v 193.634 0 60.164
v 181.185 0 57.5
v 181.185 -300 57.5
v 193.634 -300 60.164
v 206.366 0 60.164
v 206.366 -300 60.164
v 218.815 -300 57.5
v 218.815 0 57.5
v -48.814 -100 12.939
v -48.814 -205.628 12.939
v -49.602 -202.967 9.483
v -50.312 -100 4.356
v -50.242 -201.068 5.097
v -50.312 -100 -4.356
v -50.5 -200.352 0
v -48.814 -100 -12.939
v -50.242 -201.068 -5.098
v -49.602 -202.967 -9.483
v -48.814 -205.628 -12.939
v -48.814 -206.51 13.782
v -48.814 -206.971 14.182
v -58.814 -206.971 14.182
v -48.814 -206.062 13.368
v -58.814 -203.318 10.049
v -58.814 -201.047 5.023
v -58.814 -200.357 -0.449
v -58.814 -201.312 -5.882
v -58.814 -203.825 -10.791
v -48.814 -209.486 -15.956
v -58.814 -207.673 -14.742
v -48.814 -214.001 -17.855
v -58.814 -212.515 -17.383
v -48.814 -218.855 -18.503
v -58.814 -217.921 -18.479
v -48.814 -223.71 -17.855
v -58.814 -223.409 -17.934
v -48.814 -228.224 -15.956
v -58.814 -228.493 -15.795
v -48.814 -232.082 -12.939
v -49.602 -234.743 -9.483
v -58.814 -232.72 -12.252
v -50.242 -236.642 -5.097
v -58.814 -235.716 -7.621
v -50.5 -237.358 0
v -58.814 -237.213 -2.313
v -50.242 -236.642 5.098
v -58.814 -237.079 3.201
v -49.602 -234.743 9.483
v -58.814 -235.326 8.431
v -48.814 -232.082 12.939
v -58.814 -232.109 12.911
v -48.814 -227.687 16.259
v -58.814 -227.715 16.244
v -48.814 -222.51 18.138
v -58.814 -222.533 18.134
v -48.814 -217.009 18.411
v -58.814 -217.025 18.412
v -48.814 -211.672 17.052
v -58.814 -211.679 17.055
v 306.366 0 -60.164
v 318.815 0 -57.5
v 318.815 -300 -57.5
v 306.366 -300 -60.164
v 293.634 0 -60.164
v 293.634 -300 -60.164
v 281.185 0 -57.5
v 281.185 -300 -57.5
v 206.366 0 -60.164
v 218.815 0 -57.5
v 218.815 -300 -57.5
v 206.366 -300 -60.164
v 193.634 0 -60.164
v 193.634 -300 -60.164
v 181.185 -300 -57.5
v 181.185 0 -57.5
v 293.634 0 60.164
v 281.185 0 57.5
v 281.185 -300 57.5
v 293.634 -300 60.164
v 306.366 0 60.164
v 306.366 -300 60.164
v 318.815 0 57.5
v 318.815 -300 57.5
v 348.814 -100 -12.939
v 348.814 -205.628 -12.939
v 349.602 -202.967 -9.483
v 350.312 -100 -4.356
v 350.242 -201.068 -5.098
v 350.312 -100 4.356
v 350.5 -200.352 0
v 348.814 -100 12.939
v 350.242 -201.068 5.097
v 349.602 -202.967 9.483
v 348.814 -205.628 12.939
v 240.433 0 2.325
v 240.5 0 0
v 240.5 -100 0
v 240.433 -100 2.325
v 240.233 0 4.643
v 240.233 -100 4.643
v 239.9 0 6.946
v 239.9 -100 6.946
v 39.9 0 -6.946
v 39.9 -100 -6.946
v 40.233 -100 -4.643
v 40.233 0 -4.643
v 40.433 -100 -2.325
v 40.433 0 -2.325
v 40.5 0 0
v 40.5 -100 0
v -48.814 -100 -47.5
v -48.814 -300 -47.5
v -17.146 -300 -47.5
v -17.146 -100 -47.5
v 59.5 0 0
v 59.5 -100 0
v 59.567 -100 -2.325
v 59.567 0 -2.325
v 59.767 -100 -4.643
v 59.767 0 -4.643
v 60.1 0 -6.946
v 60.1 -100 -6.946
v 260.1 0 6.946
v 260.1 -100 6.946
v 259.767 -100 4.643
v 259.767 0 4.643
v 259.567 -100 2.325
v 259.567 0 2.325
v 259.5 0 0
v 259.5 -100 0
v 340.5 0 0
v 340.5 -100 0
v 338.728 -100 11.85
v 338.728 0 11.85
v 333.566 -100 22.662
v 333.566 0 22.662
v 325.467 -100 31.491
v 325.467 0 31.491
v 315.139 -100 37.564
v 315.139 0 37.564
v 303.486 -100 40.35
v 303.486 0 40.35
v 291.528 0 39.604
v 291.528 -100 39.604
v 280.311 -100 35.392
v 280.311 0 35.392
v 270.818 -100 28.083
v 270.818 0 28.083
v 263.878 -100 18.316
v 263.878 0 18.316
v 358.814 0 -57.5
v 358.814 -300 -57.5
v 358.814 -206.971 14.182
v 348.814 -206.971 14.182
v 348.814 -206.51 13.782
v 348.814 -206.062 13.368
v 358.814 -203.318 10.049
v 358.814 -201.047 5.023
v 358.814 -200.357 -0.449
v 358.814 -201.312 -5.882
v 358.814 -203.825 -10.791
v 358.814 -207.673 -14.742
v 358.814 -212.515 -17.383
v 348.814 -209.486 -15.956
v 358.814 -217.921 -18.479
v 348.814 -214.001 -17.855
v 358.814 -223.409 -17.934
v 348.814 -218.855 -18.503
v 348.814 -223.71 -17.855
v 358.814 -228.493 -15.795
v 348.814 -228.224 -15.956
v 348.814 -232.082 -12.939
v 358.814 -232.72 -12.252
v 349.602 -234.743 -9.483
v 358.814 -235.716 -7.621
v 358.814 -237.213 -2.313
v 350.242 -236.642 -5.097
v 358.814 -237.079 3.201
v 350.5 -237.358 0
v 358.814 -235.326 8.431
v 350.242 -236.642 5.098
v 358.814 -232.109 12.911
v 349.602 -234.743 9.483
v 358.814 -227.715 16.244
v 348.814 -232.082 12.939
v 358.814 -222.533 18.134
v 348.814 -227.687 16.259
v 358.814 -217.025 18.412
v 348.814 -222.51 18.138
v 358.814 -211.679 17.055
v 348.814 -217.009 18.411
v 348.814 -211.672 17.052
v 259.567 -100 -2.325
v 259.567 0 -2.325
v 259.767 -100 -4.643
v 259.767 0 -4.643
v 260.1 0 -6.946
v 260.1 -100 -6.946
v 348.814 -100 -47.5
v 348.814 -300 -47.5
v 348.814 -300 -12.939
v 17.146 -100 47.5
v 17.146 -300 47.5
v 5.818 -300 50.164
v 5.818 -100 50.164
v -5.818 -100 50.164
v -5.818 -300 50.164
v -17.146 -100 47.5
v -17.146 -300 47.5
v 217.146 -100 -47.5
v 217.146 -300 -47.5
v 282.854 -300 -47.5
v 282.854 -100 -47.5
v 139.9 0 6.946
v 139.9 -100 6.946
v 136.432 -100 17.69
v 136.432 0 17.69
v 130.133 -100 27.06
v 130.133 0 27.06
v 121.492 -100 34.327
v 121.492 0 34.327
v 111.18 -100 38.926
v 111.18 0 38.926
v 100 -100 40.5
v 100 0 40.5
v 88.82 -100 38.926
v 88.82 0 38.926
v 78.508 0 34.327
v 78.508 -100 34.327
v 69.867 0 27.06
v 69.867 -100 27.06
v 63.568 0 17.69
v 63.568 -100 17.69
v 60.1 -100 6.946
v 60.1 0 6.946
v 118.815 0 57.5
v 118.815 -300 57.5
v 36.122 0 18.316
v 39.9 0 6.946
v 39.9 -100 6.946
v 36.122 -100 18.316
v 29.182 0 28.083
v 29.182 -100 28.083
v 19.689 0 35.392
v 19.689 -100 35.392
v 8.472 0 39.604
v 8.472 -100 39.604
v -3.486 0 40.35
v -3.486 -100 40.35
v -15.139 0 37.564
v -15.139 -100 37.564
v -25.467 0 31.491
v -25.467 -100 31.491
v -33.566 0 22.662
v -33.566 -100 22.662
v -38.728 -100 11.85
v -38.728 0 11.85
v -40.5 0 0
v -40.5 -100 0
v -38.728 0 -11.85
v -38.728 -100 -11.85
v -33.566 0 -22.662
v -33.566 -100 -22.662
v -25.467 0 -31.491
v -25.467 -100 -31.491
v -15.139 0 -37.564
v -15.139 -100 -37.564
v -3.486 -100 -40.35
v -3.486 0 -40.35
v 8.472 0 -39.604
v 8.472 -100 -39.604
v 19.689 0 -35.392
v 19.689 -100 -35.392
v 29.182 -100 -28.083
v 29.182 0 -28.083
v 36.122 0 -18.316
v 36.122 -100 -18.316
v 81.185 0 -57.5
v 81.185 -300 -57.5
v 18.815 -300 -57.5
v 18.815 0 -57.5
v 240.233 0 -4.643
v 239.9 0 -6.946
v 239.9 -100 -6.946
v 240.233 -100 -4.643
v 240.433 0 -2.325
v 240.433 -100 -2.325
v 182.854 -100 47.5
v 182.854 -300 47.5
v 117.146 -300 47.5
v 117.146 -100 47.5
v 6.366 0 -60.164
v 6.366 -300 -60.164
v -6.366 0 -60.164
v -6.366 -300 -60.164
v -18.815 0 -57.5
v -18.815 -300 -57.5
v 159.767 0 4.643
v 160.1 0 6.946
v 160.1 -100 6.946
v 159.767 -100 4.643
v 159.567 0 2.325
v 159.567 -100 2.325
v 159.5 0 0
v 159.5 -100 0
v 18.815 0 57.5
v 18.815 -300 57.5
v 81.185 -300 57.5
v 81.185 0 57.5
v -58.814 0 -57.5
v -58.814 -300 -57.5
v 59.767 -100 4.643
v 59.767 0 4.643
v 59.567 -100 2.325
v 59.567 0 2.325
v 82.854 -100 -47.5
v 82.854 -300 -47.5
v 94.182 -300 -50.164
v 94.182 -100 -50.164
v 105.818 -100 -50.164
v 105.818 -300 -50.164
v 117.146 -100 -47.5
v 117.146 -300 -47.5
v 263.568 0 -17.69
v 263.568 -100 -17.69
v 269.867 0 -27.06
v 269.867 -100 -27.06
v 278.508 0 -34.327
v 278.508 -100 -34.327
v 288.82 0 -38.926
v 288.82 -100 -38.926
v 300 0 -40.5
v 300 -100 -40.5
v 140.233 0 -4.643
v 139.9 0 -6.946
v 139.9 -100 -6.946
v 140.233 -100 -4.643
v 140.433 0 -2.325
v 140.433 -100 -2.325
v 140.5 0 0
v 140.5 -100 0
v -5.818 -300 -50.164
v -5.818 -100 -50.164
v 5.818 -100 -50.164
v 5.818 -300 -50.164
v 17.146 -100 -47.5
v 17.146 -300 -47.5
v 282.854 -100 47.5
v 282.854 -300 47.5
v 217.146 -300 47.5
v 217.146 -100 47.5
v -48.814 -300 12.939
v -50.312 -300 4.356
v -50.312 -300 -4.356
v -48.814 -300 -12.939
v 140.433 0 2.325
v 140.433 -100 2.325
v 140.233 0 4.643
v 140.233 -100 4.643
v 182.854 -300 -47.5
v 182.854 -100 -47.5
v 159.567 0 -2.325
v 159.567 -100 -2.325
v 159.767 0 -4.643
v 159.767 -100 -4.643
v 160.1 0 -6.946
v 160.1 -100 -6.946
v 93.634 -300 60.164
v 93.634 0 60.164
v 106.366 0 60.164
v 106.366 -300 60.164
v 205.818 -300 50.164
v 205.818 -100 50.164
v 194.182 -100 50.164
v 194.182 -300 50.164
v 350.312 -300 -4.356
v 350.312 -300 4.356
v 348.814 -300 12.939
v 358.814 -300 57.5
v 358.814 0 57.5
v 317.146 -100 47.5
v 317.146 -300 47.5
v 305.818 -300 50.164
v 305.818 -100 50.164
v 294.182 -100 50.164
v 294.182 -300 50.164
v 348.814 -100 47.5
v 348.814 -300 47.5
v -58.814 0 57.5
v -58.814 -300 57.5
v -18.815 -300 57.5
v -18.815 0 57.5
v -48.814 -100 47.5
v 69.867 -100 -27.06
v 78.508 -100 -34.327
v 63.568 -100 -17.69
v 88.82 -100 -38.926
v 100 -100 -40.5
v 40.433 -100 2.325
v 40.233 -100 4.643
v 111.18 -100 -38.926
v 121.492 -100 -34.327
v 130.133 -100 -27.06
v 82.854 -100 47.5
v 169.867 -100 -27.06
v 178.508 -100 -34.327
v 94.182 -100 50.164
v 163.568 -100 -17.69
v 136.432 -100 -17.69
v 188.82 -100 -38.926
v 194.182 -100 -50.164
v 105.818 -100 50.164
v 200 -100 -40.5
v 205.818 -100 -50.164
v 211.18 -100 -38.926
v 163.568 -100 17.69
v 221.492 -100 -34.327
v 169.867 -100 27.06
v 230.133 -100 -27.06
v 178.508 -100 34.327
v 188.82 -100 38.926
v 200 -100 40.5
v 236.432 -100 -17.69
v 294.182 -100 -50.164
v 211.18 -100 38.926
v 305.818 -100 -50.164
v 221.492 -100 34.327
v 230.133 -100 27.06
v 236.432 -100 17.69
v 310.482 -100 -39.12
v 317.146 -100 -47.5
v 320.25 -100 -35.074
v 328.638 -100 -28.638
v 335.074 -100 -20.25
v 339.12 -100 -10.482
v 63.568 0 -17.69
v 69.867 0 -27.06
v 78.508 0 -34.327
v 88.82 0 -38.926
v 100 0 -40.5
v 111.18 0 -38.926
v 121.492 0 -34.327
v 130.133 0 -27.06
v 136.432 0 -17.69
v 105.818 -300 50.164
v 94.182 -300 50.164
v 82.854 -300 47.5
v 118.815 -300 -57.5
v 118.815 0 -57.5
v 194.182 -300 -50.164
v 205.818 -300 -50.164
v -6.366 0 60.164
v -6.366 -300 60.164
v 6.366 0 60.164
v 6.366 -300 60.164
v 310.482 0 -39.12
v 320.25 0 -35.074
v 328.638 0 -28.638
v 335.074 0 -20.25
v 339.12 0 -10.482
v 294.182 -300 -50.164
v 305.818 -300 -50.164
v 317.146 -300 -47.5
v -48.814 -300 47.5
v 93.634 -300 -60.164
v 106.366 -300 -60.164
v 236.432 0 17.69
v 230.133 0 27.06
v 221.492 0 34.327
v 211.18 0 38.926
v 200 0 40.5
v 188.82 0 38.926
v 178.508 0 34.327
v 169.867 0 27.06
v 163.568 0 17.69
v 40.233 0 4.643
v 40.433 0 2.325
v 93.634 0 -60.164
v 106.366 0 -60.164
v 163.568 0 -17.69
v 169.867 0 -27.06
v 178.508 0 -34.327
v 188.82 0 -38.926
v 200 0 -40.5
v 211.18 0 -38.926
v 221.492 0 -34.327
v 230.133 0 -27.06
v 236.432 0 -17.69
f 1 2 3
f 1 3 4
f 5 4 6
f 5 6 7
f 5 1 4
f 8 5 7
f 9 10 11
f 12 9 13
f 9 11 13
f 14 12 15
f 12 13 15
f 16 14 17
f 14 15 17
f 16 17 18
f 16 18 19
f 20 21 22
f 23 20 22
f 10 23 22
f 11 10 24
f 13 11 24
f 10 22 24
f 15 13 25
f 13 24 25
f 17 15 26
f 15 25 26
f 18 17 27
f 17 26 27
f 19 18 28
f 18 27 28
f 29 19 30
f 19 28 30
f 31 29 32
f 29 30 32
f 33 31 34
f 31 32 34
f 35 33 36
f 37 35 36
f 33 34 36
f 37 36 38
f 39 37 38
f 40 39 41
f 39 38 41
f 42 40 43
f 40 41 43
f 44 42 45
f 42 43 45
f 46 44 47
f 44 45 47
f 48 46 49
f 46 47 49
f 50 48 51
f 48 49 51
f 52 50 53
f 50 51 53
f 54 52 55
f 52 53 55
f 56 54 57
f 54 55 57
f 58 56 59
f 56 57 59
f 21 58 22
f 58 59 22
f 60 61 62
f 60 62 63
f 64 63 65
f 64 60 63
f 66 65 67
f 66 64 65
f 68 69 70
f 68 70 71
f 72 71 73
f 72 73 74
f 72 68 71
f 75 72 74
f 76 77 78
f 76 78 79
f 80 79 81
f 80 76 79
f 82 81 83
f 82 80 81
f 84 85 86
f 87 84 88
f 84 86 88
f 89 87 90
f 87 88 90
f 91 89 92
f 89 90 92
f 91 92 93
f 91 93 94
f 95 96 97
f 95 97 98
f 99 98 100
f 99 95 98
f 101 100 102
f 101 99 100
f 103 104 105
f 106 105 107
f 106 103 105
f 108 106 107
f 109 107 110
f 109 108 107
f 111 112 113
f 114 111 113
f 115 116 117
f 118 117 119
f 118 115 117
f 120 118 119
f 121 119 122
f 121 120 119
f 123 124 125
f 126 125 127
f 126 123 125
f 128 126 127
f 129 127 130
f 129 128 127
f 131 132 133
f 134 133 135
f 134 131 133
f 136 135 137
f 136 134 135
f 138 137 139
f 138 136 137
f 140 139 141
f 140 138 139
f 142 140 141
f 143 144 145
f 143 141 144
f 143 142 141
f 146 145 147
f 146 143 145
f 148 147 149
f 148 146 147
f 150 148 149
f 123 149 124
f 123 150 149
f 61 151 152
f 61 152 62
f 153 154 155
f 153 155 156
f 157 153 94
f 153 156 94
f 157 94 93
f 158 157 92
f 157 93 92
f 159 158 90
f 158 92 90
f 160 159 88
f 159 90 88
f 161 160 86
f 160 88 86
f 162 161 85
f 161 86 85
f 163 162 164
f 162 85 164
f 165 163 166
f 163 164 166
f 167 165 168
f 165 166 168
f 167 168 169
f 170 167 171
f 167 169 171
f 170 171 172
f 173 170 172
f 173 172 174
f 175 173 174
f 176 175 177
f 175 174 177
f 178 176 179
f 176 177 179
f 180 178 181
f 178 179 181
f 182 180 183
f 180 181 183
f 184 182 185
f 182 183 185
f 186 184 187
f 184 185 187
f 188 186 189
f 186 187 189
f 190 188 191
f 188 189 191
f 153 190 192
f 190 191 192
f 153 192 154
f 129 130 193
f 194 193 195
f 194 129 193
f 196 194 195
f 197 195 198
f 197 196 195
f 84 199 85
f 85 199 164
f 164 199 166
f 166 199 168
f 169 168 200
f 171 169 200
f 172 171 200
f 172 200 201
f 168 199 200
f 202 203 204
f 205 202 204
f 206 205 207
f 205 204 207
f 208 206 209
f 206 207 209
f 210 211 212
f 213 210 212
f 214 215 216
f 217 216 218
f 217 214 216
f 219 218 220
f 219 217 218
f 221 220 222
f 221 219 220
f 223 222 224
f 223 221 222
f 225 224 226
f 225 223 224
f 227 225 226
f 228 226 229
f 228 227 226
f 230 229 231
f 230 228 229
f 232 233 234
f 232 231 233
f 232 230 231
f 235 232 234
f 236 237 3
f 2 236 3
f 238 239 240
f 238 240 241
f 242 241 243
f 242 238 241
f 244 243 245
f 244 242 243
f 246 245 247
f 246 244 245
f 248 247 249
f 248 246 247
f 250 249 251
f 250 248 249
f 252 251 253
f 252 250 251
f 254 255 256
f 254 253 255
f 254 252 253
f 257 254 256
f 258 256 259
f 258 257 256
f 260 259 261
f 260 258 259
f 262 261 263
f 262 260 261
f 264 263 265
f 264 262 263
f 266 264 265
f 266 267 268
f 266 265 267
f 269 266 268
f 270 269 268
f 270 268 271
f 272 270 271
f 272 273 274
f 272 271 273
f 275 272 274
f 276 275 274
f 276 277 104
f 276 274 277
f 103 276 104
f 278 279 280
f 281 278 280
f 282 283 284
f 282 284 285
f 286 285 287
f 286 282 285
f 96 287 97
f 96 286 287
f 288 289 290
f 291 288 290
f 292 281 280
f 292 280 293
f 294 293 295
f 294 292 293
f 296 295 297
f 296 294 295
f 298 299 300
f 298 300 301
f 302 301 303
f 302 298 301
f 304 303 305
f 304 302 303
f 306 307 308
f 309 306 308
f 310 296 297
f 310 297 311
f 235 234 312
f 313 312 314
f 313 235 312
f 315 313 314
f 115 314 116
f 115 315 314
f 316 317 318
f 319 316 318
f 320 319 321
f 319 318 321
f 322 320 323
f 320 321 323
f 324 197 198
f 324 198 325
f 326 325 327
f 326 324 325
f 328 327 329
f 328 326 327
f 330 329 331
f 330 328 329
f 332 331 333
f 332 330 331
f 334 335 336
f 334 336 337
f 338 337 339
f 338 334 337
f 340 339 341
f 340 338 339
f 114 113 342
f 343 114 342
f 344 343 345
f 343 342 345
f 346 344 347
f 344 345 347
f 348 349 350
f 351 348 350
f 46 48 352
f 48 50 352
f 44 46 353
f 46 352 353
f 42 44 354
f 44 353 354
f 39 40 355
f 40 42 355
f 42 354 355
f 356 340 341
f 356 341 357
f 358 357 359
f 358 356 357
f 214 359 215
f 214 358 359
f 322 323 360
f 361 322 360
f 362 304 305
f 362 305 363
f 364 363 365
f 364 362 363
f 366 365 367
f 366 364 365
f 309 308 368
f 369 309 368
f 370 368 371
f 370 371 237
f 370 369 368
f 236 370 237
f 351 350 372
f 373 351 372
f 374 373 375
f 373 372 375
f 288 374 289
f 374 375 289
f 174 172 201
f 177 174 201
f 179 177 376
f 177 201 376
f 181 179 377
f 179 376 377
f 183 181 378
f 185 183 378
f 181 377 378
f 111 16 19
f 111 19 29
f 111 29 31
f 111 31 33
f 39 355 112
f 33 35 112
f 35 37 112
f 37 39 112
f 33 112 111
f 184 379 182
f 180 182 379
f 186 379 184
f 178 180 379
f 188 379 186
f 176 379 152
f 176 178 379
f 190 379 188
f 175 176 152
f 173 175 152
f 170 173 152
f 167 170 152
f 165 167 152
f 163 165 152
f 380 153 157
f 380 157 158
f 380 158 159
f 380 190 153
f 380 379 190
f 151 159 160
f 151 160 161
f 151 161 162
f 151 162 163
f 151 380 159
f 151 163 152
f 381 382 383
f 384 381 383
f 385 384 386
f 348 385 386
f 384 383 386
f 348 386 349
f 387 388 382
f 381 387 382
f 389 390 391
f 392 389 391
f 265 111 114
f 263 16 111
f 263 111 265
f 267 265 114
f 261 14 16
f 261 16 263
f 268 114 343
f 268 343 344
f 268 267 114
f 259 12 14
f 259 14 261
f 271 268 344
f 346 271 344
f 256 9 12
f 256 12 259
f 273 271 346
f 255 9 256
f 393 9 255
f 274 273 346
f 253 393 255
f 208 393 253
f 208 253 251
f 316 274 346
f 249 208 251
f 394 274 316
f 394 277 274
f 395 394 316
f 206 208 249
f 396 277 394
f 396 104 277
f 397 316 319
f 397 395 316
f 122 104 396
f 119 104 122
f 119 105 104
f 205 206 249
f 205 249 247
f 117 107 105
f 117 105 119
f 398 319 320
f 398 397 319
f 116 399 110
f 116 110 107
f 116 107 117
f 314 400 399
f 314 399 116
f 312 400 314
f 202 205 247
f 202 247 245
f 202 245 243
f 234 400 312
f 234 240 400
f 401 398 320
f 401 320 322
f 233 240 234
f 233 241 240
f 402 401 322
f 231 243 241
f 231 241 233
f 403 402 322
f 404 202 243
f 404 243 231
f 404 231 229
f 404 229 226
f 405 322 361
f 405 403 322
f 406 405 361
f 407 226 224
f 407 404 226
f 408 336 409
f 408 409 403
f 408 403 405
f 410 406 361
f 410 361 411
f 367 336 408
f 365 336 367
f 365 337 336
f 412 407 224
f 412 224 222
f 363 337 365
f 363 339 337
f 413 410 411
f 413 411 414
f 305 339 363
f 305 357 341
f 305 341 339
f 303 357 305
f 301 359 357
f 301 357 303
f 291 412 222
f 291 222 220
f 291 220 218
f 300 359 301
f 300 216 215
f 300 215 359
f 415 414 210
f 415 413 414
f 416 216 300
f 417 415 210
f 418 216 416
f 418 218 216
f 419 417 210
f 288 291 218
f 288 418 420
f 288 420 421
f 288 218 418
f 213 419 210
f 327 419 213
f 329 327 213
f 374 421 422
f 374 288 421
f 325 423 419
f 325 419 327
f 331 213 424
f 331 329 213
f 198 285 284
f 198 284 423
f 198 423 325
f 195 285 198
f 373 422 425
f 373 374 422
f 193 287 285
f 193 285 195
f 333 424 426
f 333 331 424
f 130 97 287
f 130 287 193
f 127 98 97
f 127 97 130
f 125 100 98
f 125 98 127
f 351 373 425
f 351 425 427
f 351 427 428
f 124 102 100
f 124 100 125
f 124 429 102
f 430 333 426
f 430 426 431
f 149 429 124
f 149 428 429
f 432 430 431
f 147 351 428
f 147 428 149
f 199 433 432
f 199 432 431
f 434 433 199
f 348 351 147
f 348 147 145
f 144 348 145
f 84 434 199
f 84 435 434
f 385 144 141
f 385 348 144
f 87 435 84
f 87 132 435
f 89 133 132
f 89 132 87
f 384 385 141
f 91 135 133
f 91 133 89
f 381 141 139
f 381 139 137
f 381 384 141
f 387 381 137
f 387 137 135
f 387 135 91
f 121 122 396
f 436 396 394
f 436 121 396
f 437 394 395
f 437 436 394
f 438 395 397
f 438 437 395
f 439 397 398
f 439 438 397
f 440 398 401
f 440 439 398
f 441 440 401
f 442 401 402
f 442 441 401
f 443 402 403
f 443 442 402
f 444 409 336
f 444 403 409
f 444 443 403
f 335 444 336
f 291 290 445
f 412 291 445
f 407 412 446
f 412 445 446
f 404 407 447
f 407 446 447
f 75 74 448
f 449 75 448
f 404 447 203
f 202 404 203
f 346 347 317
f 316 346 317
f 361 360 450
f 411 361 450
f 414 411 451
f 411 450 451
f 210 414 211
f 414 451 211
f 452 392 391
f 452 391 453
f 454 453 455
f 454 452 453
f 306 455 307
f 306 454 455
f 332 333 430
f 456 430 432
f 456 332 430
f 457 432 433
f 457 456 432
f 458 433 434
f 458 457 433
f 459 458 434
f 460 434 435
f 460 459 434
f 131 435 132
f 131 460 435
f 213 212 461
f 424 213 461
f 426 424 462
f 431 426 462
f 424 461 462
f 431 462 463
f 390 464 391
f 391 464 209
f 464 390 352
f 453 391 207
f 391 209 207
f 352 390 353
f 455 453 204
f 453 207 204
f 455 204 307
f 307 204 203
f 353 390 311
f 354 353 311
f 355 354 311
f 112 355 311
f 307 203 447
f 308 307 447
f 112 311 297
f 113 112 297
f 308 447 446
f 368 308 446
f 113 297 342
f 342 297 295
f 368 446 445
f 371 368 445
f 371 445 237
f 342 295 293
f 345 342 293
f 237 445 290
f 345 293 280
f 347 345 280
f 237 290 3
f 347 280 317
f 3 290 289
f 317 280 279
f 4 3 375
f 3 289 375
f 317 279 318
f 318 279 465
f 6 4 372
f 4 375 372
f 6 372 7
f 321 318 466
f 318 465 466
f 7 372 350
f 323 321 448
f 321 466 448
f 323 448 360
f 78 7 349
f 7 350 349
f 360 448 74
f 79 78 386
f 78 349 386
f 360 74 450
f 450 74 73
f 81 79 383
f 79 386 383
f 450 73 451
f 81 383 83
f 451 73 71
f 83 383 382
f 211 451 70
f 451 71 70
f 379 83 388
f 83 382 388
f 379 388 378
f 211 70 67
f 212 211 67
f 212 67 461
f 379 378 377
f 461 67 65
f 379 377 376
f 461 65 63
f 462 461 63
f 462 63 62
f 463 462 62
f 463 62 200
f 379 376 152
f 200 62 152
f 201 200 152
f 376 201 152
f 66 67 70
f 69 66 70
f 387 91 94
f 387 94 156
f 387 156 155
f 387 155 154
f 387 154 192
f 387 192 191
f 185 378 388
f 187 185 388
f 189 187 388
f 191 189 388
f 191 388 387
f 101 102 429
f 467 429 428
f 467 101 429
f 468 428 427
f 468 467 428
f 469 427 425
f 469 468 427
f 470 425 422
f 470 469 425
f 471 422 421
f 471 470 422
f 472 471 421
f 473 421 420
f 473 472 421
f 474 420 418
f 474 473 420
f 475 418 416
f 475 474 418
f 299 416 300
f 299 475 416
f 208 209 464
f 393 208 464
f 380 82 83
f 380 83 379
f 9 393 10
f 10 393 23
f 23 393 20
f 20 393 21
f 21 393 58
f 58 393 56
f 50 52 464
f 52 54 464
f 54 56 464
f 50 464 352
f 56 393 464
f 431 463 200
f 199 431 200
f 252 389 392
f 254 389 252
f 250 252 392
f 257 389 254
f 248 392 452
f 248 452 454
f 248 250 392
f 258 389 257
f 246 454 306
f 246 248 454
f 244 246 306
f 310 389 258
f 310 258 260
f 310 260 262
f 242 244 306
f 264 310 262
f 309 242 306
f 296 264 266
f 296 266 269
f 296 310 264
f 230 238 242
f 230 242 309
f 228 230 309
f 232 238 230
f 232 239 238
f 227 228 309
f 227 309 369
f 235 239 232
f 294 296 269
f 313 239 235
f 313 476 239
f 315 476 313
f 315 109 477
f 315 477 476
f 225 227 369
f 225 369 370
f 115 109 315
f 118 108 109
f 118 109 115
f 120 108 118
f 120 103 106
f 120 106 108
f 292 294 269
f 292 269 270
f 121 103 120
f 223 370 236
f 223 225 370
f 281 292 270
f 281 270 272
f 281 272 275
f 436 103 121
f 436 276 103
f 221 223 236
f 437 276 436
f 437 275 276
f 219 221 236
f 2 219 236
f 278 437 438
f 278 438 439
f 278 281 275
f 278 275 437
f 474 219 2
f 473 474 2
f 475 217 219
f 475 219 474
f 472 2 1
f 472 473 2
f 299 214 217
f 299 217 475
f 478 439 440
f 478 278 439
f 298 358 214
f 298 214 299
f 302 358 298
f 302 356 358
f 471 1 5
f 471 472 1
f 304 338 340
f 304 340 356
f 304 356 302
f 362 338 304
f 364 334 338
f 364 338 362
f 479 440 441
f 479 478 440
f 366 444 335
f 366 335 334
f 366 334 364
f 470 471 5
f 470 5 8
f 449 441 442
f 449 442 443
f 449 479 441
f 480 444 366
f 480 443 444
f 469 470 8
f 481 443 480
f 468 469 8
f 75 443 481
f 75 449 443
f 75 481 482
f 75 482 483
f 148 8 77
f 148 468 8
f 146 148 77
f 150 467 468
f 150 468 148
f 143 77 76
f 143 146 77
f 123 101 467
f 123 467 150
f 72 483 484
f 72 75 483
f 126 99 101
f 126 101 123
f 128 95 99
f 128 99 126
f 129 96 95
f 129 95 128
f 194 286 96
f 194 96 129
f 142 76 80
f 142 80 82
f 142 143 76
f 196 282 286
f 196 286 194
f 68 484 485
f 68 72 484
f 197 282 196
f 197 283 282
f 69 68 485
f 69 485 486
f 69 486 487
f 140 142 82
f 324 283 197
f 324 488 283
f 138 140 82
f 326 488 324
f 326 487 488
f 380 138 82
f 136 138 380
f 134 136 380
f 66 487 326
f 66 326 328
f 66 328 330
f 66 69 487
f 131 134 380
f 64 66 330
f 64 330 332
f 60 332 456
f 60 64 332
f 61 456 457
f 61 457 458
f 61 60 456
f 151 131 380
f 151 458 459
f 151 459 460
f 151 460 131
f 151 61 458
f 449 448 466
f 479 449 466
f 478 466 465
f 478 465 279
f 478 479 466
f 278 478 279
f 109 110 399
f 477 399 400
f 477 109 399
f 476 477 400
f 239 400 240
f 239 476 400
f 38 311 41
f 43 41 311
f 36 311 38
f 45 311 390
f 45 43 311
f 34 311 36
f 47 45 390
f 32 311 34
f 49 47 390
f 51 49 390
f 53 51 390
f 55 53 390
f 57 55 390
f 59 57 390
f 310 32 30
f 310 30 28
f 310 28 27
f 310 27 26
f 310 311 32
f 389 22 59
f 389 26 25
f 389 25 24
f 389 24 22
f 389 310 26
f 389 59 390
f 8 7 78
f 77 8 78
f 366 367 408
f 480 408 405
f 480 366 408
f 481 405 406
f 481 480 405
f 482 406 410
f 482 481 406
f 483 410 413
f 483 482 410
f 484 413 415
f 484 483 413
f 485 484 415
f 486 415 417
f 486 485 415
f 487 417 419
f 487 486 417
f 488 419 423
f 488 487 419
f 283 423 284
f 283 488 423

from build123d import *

# Parameters (mm, degrees)
BOSS_EXTRUDE2_DEPTH = 300
CUT_EXTRUDE1_DEPTH  = 200
SKETCH4_R           = 18.503
CUT_EXTRUDE2_DEPTH  = 500
CUT_EXTRUDE3_DEPTH  = 300


with BuildPart() as part:
    # Sketch1 → Boss-Extrude2 (new body)
    with BuildSketch(Plane(origin=(0, 0, 0), x_dir=(1, 0, 0), z_dir=(0, 1, 0))):
        with BuildLine():
            ThreePointArc((39.9, 6.945502142), (43.30489778, 21.11670865), (50, 34.062442661))
            ThreePointArc((50, 34.062442661), (36.348342006, 48.363705745), (18.814887722, 57.5))
            Line((18.814887722, 57.5), (0, 57.5))
            Line((0, 57.5), (0, 40.5))
            ThreePointArc((0, 40.5), (26.066809963, 30.99631298), (39.9, 6.945502142))
        make_face()
        with BuildLine():
            ThreePointArc((0, -40.5), (-40.5, 0), (0, 40.5))
            Line((0, 40.5), (0, 57.5))
            Line((0, 57.5), (-18.814887722, 57.5))
            ThreePointArc((-18.814887722, 57.5), (-44.4487457, 41.04337956), (-58.814340786, 14.181795299))
            Line((-58.814340786, 14.181795299), (-58.814340786, -14.181795299))
            ThreePointArc((-58.814340786, -14.181795299), (-44.4487457, -41.04337956), (-18.814887722, -57.5))
            Line((-18.814887722, -57.5), (0, -57.5))
            Line((0, -57.5), (0, -40.5))
        make_face()
        with BuildLine():
            ThreePointArc((18.814887722, -57.5), (36.348342006, -48.363705745), (50, -34.062442661))
            ThreePointArc((50, -34.062442661), (43.30489778, -21.11670865), (39.9, -6.945502142))
            ThreePointArc((39.9, -6.945502142), (26.066809963, -30.99631298), (0, -40.5))
            Line((0, -40.5), (0, -57.5))
            Line((0, -57.5), (18.814887722, -57.5))
        make_face()
        with BuildLine():
            ThreePointArc((60.1, -6.945502142), (59.650278811, -3.485685012), (59.5, 0))
            Line((59.5, 0), (40.5, 0))
            ThreePointArc((40.5, 0), (40.349721189, -3.485685012), (39.9, -6.945502142))
            ThreePointArc((39.9, -6.945502142), (43.30489778, -21.11670865), (50, -34.062442661))
            ThreePointArc((50, -34.062442661), (56.69510222, -21.11670865), (60.1, -6.945502142))
        make_face()
        with BuildLine():
            Line((40.5, 0), (59.5, 0))
            ThreePointArc((59.5, 0), (59.650278811, 3.485685012), (60.1, 6.945502142))
            ThreePointArc((60.1, 6.945502142), (56.69510222, 21.11670865), (50, 34.062442661))
            ThreePointArc((50, 34.062442661), (43.30489778, 21.11670865), (39.9, 6.945502142))
            ThreePointArc((39.9, 6.945502142), (40.349721189, 3.485685012), (40.5, 0))
        make_face()
        with BuildLine():
            ThreePointArc((139.9, -6.945502142), (100, -40.5), (60.1, -6.945502142))
            ThreePointArc((60.1, -6.945502142), (56.69510222, -21.11670865), (50, -34.062442661))
            ThreePointArc((50, -34.062442661), (63.651657994, -48.363705745), (81.185112278, -57.5))
            Line((81.185112278, -57.5), (118.814887722, -57.5))
            ThreePointArc((118.814887722, -57.5), (136.348342006, -48.363705745), (150, -34.062442661))
            ThreePointArc((150, -34.062442661), (143.30489778, -21.11670865), (139.9, -6.945502142))
        make_face()
        with BuildLine():
            ThreePointArc((50, 34.062442661), (56.69510222, 21.11670865), (60.1, 6.945502142))
            ThreePointArc((60.1, 6.945502142), (100, 40.5), (139.9, 6.945502142))
            ThreePointArc((139.9, 6.945502142), (143.30489778, 21.11670865), (150, 34.062442661))
            ThreePointArc((150, 34.062442661), (136.348342006, 48.363705745), (118.814887722, 57.5))
            Line((118.814887722, 57.5), (81.185112278, 57.5))
            ThreePointArc((81.185112278, 57.5), (63.651657994, 48.363705745), (50, 34.062442661))
        make_face()
        with BuildLine():
            ThreePointArc((150, 34.062442661), (143.30489778, 21.11670865), (139.9, 6.945502142))
            ThreePointArc((139.9, 6.945502142), (140.349721189, 3.485685012), (140.5, 0))
            Line((140.5, 0), (159.5, 0))
            ThreePointArc((159.5, 0), (159.650278811, 3.485685012), (160.1, 6.945502142))
            ThreePointArc((160.1, 6.945502142), (156.69510222, 21.11670865), (150, 34.062442661))
        make_face()
        with BuildLine():
            ThreePointArc((140.5, 0), (140.349721189, -3.485685012), (139.9, -6.945502142))
            ThreePointArc((139.9, -6.945502142), (143.30489778, -21.11670865), (150, -34.062442661))
            ThreePointArc((150, -34.062442661), (156.69510222, -21.11670865), (160.1, -6.945502142))
            ThreePointArc((160.1, -6.945502142), (159.650278811, -3.485685012), (159.5, 0))
            Line((159.5, 0), (140.5, 0))
        make_face()
        with BuildLine():
            ThreePointArc((181.185112278, 57.5), (163.651657994, 48.363705745), (150, 34.062442661))
            ThreePointArc((150, 34.062442661), (156.69510222, 21.11670865), (160.1, 6.945502142))
            ThreePointArc((160.1, 6.945502142), (200, 40.5), (239.9, 6.945502142))
            ThreePointArc((239.9, 6.945502142), (243.30489778, 21.11670865), (250, 34.062442661))
            ThreePointArc((250, 34.062442661), (236.348342006, 48.363705745), (218.814887722, 57.5))
            Line((218.814887722, 57.5), (181.185112278, 57.5))
        make_face()
        with BuildLine():
            ThreePointArc((160.1, -6.945502142), (156.69510222, -21.11670865), (150, -34.062442661))
            ThreePointArc((150, -34.062442661), (163.651657994, -48.363705745), (181.185112278, -57.5))
            Line((181.185112278, -57.5), (218.814887722, -57.5))
            ThreePointArc((218.814887722, -57.5), (236.348342006, -48.363705745), (250, -34.062442661))
            ThreePointArc((250, -34.062442661), (243.30489778, -21.11670865), (239.9, -6.945502142))
            ThreePointArc((239.9, -6.945502142), (200, -40.5), (160.1, -6.945502142))
        make_face()
        with BuildLine():
            ThreePointArc((250, 34.062442661), (243.30489778, 21.11670865), (239.9, 6.945502142))
            ThreePointArc((239.9, 6.945502142), (240.349721189, 3.485685012), (240.5, 0))
            Line((240.5, 0), (259.5, 0))
            ThreePointArc((259.5, 0), (259.650278811, 3.485685012), (260.1, 6.945502142))
            ThreePointArc((260.1, 6.945502142), (256.69510222, 21.11670865), (250, 34.062442661))
        make_face()
        with BuildLine():
            ThreePointArc((240.5, 0), (240.349721189, -3.485685012), (239.9, -6.945502142))
            ThreePointArc((239.9, -6.945502142), (243.30489778, -21.11670865), (250, -34.062442661))
            ThreePointArc((250, -34.062442661), (256.69510222, -21.11670865), (260.1, -6.945502142))
            ThreePointArc((260.1, -6.945502142), (259.650278811, -3.485685012), (259.5, 0))
            Line((259.5, 0), (240.5, 0))
        make_face()
        with BuildLine():
            ThreePointArc((281.185112278, 57.5), (263.651657994, 48.363705745), (250, 34.062442661))
            ThreePointArc((250, 34.062442661), (256.69510222, 21.11670865), (260.1, 6.945502142))
            ThreePointArc((260.1, 6.945502142), (273.933190037, 30.99631298), (300, 40.5))
            Line((300, 40.5), (300, 57.5))
            Line((300, 57.5), (281.185112278, 57.5))
        make_face()
        with BuildLine():
            ThreePointArc((260.1, -6.945502142), (256.69510222, -21.11670865), (250, -34.062442661))
            ThreePointArc((250, -34.062442661), (263.651657994, -48.363705745), (281.185112278, -57.5))
            Line((281.185112278, -57.5), (300, -57.5))
            Line((300, -57.5), (318.814887722, -57.5))
            ThreePointArc((318.814887722, -57.5), (344.4487457, -41.04337956), (358.814340786, -14.181795299))
            Line((358.814340786, -14.181795299), (358.814340786, 14.181795299))
            ThreePointArc((358.814340786, 14.181795299), (344.4487457, 41.04337956), (318.814887722, 57.5))
            Line((318.814887722, 57.5), (300, 57.5))
            Line((300, 57.5), (300, 40.5))
            ThreePointArc((300, 40.5), (328.637824638, 28.637824638), (340.5, 0))
            ThreePointArc((340.5, 0), (303.485685012, -40.349721189), (260.1, -6.945502142))
        make_face()
        with BuildLine():
            ThreePointArc((81.185112278, -57.5), (63.651657994, -48.363705745), (50, -34.062442661))
            ThreePointArc((50, -34.062442661), (36.348342006, -48.363705745), (18.814887722, -57.5))
            Line((18.814887722, -57.5), (81.185112278, -57.5))
        make_face()
        with BuildLine():
            ThreePointArc((181.185112278, -57.5), (163.651657994, -48.363705745), (150, -34.062442661))
            ThreePointArc((150, -34.062442661), (136.348342006, -48.363705745), (118.814887722, -57.5))
            Line((118.814887722, -57.5), (181.185112278, -57.5))
        make_face()
        with BuildLine():
            ThreePointArc((250, -34.062442661), (236.348342006, -48.363705745), (218.814887722, -57.5))
            Line((218.814887722, -57.5), (281.185112278, -57.5))
            ThreePointArc((281.185112278, -57.5), (263.651657994, -48.363705745), (250, -34.062442661))
        make_face()
        with BuildLine():
            ThreePointArc((18.814887722, 57.5), (36.348342006, 48.363705745), (50, 34.062442661))
            ThreePointArc((50, 34.062442661), (63.651657994, 48.363705745), (81.185112278, 57.5))
            Line((81.185112278, 57.5), (18.814887722, 57.5))
        make_face()
        with BuildLine():
            ThreePointArc((118.814887722, 57.5), (136.348342006, 48.363705745), (150, 34.062442661))
            ThreePointArc((150, 34.062442661), (163.651657994, 48.363705745), (181.185112278, 57.5))
            Line((181.185112278, 57.5), (118.814887722, 57.5))
        make_face()
        with BuildLine():
            Line((281.185112278, 57.5), (218.814887722, 57.5))
            ThreePointArc((218.814887722, 57.5), (236.348342006, 48.363705745), (250, 34.062442661))
            ThreePointArc((250, 34.062442661), (263.651657994, 48.363705745), (281.185112278, 57.5))
        make_face()
        with BuildLine():
            ThreePointArc((358.814340786, -14.181795299), (344.4487457, -41.04337956), (318.814887722, -57.5))
            Line((318.814887722, -57.5), (358.814340786, -57.5))
            Line((358.814340786, -57.5), (358.814340786, -14.181795299))
        make_face()
        with BuildLine():
            Line((358.814340786, 57.5), (318.814887722, 57.5))
            ThreePointArc((318.814887722, 57.5), (344.4487457, 41.04337956), (358.814340786, 14.181795299))
            Line((358.814340786, 14.181795299), (358.814340786, 57.5))
        make_face()
        with BuildLine():
            ThreePointArc((-58.814340786, 14.181795299), (-44.4487457, 41.04337956), (-18.814887722, 57.5))
            Line((-18.814887722, 57.5), (-58.814340786, 57.5))
            Line((-58.814340786, 57.5), (-58.814340786, 14.181795299))
        make_face()
        with BuildLine():
            Line((-58.814340786, -57.5), (-18.814887722, -57.5))
            ThreePointArc((-18.814887722, -57.5), (-44.4487457, -41.04337956), (-58.814340786, -14.181795299))
            Line((-58.814340786, -14.181795299), (-58.814340786, -57.5))
        make_face()
        with BuildLine():
            Line((0, 57.5), (18.814887722, 57.5))
            ThreePointArc((18.814887722, 57.5), (0, 60.5), (-18.814887722, 57.5))
            Line((-18.814887722, 57.5), (0, 57.5))
        make_face()
        with BuildLine():
            ThreePointArc((118.814887722, 57.5), (100, 60.5), (81.185112278, 57.5))
            Line((81.185112278, 57.5), (118.814887722, 57.5))
        make_face()
        with BuildLine():
            ThreePointArc((218.814887722, 57.5), (200, 60.5), (181.185112278, 57.5))
            Line((181.185112278, 57.5), (218.814887722, 57.5))
        make_face()
        with BuildLine():
            ThreePointArc((318.814887722, 57.5), (300, 60.5), (281.185112278, 57.5))
            Line((281.185112278, 57.5), (300, 57.5))
            Line((300, 57.5), (318.814887722, 57.5))
        make_face()
        with BuildLine():
            Line((300, -57.5), (281.185112278, -57.5))
            ThreePointArc((281.185112278, -57.5), (300, -60.5), (318.814887722, -57.5))
            Line((318.814887722, -57.5), (300, -57.5))
        make_face()
        with BuildLine():
            Line((218.814887722, -57.5), (181.185112278, -57.5))
            ThreePointArc((181.185112278, -57.5), (200, -60.5), (218.814887722, -57.5))
        make_face()
        with BuildLine():
            Line((118.814887722, -57.5), (81.185112278, -57.5))
            ThreePointArc((81.185112278, -57.5), (100, -60.5), (118.814887722, -57.5))
        make_face()
        with BuildLine():
            ThreePointArc((-18.814887722, -57.5), (0, -60.5), (18.814887722, -57.5))
            Line((18.814887722, -57.5), (0, -57.5))
            Line((0, -57.5), (-18.814887722, -57.5))
        make_face()
        with BuildLine():
            Line((-58.814340786, -14.181795299), (-58.814340786, 14.181795299))
            ThreePointArc((-58.814340786, 14.181795299), (-60.5, 0), (-58.814340786, -14.181795299))
        make_face()
        with BuildLine():
            ThreePointArc((360.5, 0), (360.077107194, 7.140811664), (358.814340786, 14.181795299))
            Line((358.814340786, 14.181795299), (358.814340786, -14.181795299))
            ThreePointArc((358.814340786, -14.181795299), (360.077107194, -7.140811664), (360.5, 0))
        make_face()
    extrude(amount=-BOSS_EXTRUDE2_DEPTH)

    # Sketch2 → Cut-Extrude1 (cut)
    with BuildSketch(Plane.XZ.offset(300)):
        with BuildLine():
            Line((-48.814340786, 47.5), (-48.814340786, 12.938706799))
            ThreePointArc((-48.814340786, 12.938706799), (-50.5, 0), (-48.814340786, -12.938706799))
            Line((-48.814340786, -12.938706799), (-48.814340786, -47.5))
            Line((-48.814340786, -47.5), (-17.146428199, -47.5))
            ThreePointArc((-17.146428199, -47.5), (0, -50.5), (17.146428199, -47.5))
            Line((17.146428199, -47.5), (82.853571801, -47.5))
            ThreePointArc((82.853571801, -47.5), (100, -50.5), (117.146428199, -47.5))
            Line((117.146428199, -47.5), (182.853571801, -47.5))
            ThreePointArc((182.853571801, -47.5), (200, -50.5), (217.146428199, -47.5))
            Line((217.146428199, -47.5), (282.853571801, -47.5))
            ThreePointArc((282.853571801, -47.5), (300, -50.5), (317.146428199, -47.5))
            Line((317.146428199, -47.5), (348.814340786, -47.5))
            Line((348.814340786, -47.5), (348.814340786, -12.938706799))
            ThreePointArc((348.814340786, -12.938706799), (350.5, 0), (348.814340786, 12.938706799))
            Line((348.814340786, 12.938706799), (348.814340786, 47.5))
            Line((348.814340786, 47.5), (317.146428199, 47.5))
            ThreePointArc((317.146428199, 47.5), (300, 50.5), (282.853571801, 47.5))
            Line((282.853571801, 47.5), (217.146428199, 47.5))
            ThreePointArc((217.146428199, 47.5), (200, 50.5), (182.853571801, 47.5))
            Line((182.853571801, 47.5), (117.146428199, 47.5))
            ThreePointArc((117.146428199, 47.5), (100, 50.5), (82.853571801, 47.5))
            Line((82.853571801, 47.5), (17.146428199, 47.5))
            ThreePointArc((17.146428199, 47.5), (0, 50.5), (-17.146428199, 47.5))
            Line((-17.146428199, 47.5), (-48.814340786, 47.5))
        make_face()
    extrude(amount=-CUT_EXTRUDE1_DEPTH, mode=Mode.SUBTRACT)

    # Sketch4 → Cut-Extrude2 (cut, symmetric)
    with BuildSketch(Plane.ZY.offset(58.814340786)):
        with Locations(Location((0, -218.855011971, 0), (0, 0, 39.963012354))):
            Circle(SKETCH4_R)
    extrude(amount=CUT_EXTRUDE2_DEPTH, both=True, mode=Mode.SUBTRACT)

    # Sketch8 → Cut-Extrude3 (cut)
    with BuildSketch(Plane(origin=(0, 0, 0), x_dir=(1, 0, 0), z_dir=(0, 1, 0))):
        with BuildLine():
            Line((-58.814340786, 14.181795299), (-58.814340786, -14.181795299))
            ThreePointArc((-58.814340786, -14.181795299), (-60.5, 0), (-58.814340786, 14.181795299))
        make_face()
        with BuildLine():
            Line((358.814340786, 14.181795299), (358.814340786, -14.181795299))
            ThreePointArc((358.814340786, -14.181795299), (360.5, 0), (358.814340786, 14.181795299))
        make_face()
    extrude(amount=-CUT_EXTRUDE3_DEPTH, mode=Mode.SUBTRACT)


solid = part.part
